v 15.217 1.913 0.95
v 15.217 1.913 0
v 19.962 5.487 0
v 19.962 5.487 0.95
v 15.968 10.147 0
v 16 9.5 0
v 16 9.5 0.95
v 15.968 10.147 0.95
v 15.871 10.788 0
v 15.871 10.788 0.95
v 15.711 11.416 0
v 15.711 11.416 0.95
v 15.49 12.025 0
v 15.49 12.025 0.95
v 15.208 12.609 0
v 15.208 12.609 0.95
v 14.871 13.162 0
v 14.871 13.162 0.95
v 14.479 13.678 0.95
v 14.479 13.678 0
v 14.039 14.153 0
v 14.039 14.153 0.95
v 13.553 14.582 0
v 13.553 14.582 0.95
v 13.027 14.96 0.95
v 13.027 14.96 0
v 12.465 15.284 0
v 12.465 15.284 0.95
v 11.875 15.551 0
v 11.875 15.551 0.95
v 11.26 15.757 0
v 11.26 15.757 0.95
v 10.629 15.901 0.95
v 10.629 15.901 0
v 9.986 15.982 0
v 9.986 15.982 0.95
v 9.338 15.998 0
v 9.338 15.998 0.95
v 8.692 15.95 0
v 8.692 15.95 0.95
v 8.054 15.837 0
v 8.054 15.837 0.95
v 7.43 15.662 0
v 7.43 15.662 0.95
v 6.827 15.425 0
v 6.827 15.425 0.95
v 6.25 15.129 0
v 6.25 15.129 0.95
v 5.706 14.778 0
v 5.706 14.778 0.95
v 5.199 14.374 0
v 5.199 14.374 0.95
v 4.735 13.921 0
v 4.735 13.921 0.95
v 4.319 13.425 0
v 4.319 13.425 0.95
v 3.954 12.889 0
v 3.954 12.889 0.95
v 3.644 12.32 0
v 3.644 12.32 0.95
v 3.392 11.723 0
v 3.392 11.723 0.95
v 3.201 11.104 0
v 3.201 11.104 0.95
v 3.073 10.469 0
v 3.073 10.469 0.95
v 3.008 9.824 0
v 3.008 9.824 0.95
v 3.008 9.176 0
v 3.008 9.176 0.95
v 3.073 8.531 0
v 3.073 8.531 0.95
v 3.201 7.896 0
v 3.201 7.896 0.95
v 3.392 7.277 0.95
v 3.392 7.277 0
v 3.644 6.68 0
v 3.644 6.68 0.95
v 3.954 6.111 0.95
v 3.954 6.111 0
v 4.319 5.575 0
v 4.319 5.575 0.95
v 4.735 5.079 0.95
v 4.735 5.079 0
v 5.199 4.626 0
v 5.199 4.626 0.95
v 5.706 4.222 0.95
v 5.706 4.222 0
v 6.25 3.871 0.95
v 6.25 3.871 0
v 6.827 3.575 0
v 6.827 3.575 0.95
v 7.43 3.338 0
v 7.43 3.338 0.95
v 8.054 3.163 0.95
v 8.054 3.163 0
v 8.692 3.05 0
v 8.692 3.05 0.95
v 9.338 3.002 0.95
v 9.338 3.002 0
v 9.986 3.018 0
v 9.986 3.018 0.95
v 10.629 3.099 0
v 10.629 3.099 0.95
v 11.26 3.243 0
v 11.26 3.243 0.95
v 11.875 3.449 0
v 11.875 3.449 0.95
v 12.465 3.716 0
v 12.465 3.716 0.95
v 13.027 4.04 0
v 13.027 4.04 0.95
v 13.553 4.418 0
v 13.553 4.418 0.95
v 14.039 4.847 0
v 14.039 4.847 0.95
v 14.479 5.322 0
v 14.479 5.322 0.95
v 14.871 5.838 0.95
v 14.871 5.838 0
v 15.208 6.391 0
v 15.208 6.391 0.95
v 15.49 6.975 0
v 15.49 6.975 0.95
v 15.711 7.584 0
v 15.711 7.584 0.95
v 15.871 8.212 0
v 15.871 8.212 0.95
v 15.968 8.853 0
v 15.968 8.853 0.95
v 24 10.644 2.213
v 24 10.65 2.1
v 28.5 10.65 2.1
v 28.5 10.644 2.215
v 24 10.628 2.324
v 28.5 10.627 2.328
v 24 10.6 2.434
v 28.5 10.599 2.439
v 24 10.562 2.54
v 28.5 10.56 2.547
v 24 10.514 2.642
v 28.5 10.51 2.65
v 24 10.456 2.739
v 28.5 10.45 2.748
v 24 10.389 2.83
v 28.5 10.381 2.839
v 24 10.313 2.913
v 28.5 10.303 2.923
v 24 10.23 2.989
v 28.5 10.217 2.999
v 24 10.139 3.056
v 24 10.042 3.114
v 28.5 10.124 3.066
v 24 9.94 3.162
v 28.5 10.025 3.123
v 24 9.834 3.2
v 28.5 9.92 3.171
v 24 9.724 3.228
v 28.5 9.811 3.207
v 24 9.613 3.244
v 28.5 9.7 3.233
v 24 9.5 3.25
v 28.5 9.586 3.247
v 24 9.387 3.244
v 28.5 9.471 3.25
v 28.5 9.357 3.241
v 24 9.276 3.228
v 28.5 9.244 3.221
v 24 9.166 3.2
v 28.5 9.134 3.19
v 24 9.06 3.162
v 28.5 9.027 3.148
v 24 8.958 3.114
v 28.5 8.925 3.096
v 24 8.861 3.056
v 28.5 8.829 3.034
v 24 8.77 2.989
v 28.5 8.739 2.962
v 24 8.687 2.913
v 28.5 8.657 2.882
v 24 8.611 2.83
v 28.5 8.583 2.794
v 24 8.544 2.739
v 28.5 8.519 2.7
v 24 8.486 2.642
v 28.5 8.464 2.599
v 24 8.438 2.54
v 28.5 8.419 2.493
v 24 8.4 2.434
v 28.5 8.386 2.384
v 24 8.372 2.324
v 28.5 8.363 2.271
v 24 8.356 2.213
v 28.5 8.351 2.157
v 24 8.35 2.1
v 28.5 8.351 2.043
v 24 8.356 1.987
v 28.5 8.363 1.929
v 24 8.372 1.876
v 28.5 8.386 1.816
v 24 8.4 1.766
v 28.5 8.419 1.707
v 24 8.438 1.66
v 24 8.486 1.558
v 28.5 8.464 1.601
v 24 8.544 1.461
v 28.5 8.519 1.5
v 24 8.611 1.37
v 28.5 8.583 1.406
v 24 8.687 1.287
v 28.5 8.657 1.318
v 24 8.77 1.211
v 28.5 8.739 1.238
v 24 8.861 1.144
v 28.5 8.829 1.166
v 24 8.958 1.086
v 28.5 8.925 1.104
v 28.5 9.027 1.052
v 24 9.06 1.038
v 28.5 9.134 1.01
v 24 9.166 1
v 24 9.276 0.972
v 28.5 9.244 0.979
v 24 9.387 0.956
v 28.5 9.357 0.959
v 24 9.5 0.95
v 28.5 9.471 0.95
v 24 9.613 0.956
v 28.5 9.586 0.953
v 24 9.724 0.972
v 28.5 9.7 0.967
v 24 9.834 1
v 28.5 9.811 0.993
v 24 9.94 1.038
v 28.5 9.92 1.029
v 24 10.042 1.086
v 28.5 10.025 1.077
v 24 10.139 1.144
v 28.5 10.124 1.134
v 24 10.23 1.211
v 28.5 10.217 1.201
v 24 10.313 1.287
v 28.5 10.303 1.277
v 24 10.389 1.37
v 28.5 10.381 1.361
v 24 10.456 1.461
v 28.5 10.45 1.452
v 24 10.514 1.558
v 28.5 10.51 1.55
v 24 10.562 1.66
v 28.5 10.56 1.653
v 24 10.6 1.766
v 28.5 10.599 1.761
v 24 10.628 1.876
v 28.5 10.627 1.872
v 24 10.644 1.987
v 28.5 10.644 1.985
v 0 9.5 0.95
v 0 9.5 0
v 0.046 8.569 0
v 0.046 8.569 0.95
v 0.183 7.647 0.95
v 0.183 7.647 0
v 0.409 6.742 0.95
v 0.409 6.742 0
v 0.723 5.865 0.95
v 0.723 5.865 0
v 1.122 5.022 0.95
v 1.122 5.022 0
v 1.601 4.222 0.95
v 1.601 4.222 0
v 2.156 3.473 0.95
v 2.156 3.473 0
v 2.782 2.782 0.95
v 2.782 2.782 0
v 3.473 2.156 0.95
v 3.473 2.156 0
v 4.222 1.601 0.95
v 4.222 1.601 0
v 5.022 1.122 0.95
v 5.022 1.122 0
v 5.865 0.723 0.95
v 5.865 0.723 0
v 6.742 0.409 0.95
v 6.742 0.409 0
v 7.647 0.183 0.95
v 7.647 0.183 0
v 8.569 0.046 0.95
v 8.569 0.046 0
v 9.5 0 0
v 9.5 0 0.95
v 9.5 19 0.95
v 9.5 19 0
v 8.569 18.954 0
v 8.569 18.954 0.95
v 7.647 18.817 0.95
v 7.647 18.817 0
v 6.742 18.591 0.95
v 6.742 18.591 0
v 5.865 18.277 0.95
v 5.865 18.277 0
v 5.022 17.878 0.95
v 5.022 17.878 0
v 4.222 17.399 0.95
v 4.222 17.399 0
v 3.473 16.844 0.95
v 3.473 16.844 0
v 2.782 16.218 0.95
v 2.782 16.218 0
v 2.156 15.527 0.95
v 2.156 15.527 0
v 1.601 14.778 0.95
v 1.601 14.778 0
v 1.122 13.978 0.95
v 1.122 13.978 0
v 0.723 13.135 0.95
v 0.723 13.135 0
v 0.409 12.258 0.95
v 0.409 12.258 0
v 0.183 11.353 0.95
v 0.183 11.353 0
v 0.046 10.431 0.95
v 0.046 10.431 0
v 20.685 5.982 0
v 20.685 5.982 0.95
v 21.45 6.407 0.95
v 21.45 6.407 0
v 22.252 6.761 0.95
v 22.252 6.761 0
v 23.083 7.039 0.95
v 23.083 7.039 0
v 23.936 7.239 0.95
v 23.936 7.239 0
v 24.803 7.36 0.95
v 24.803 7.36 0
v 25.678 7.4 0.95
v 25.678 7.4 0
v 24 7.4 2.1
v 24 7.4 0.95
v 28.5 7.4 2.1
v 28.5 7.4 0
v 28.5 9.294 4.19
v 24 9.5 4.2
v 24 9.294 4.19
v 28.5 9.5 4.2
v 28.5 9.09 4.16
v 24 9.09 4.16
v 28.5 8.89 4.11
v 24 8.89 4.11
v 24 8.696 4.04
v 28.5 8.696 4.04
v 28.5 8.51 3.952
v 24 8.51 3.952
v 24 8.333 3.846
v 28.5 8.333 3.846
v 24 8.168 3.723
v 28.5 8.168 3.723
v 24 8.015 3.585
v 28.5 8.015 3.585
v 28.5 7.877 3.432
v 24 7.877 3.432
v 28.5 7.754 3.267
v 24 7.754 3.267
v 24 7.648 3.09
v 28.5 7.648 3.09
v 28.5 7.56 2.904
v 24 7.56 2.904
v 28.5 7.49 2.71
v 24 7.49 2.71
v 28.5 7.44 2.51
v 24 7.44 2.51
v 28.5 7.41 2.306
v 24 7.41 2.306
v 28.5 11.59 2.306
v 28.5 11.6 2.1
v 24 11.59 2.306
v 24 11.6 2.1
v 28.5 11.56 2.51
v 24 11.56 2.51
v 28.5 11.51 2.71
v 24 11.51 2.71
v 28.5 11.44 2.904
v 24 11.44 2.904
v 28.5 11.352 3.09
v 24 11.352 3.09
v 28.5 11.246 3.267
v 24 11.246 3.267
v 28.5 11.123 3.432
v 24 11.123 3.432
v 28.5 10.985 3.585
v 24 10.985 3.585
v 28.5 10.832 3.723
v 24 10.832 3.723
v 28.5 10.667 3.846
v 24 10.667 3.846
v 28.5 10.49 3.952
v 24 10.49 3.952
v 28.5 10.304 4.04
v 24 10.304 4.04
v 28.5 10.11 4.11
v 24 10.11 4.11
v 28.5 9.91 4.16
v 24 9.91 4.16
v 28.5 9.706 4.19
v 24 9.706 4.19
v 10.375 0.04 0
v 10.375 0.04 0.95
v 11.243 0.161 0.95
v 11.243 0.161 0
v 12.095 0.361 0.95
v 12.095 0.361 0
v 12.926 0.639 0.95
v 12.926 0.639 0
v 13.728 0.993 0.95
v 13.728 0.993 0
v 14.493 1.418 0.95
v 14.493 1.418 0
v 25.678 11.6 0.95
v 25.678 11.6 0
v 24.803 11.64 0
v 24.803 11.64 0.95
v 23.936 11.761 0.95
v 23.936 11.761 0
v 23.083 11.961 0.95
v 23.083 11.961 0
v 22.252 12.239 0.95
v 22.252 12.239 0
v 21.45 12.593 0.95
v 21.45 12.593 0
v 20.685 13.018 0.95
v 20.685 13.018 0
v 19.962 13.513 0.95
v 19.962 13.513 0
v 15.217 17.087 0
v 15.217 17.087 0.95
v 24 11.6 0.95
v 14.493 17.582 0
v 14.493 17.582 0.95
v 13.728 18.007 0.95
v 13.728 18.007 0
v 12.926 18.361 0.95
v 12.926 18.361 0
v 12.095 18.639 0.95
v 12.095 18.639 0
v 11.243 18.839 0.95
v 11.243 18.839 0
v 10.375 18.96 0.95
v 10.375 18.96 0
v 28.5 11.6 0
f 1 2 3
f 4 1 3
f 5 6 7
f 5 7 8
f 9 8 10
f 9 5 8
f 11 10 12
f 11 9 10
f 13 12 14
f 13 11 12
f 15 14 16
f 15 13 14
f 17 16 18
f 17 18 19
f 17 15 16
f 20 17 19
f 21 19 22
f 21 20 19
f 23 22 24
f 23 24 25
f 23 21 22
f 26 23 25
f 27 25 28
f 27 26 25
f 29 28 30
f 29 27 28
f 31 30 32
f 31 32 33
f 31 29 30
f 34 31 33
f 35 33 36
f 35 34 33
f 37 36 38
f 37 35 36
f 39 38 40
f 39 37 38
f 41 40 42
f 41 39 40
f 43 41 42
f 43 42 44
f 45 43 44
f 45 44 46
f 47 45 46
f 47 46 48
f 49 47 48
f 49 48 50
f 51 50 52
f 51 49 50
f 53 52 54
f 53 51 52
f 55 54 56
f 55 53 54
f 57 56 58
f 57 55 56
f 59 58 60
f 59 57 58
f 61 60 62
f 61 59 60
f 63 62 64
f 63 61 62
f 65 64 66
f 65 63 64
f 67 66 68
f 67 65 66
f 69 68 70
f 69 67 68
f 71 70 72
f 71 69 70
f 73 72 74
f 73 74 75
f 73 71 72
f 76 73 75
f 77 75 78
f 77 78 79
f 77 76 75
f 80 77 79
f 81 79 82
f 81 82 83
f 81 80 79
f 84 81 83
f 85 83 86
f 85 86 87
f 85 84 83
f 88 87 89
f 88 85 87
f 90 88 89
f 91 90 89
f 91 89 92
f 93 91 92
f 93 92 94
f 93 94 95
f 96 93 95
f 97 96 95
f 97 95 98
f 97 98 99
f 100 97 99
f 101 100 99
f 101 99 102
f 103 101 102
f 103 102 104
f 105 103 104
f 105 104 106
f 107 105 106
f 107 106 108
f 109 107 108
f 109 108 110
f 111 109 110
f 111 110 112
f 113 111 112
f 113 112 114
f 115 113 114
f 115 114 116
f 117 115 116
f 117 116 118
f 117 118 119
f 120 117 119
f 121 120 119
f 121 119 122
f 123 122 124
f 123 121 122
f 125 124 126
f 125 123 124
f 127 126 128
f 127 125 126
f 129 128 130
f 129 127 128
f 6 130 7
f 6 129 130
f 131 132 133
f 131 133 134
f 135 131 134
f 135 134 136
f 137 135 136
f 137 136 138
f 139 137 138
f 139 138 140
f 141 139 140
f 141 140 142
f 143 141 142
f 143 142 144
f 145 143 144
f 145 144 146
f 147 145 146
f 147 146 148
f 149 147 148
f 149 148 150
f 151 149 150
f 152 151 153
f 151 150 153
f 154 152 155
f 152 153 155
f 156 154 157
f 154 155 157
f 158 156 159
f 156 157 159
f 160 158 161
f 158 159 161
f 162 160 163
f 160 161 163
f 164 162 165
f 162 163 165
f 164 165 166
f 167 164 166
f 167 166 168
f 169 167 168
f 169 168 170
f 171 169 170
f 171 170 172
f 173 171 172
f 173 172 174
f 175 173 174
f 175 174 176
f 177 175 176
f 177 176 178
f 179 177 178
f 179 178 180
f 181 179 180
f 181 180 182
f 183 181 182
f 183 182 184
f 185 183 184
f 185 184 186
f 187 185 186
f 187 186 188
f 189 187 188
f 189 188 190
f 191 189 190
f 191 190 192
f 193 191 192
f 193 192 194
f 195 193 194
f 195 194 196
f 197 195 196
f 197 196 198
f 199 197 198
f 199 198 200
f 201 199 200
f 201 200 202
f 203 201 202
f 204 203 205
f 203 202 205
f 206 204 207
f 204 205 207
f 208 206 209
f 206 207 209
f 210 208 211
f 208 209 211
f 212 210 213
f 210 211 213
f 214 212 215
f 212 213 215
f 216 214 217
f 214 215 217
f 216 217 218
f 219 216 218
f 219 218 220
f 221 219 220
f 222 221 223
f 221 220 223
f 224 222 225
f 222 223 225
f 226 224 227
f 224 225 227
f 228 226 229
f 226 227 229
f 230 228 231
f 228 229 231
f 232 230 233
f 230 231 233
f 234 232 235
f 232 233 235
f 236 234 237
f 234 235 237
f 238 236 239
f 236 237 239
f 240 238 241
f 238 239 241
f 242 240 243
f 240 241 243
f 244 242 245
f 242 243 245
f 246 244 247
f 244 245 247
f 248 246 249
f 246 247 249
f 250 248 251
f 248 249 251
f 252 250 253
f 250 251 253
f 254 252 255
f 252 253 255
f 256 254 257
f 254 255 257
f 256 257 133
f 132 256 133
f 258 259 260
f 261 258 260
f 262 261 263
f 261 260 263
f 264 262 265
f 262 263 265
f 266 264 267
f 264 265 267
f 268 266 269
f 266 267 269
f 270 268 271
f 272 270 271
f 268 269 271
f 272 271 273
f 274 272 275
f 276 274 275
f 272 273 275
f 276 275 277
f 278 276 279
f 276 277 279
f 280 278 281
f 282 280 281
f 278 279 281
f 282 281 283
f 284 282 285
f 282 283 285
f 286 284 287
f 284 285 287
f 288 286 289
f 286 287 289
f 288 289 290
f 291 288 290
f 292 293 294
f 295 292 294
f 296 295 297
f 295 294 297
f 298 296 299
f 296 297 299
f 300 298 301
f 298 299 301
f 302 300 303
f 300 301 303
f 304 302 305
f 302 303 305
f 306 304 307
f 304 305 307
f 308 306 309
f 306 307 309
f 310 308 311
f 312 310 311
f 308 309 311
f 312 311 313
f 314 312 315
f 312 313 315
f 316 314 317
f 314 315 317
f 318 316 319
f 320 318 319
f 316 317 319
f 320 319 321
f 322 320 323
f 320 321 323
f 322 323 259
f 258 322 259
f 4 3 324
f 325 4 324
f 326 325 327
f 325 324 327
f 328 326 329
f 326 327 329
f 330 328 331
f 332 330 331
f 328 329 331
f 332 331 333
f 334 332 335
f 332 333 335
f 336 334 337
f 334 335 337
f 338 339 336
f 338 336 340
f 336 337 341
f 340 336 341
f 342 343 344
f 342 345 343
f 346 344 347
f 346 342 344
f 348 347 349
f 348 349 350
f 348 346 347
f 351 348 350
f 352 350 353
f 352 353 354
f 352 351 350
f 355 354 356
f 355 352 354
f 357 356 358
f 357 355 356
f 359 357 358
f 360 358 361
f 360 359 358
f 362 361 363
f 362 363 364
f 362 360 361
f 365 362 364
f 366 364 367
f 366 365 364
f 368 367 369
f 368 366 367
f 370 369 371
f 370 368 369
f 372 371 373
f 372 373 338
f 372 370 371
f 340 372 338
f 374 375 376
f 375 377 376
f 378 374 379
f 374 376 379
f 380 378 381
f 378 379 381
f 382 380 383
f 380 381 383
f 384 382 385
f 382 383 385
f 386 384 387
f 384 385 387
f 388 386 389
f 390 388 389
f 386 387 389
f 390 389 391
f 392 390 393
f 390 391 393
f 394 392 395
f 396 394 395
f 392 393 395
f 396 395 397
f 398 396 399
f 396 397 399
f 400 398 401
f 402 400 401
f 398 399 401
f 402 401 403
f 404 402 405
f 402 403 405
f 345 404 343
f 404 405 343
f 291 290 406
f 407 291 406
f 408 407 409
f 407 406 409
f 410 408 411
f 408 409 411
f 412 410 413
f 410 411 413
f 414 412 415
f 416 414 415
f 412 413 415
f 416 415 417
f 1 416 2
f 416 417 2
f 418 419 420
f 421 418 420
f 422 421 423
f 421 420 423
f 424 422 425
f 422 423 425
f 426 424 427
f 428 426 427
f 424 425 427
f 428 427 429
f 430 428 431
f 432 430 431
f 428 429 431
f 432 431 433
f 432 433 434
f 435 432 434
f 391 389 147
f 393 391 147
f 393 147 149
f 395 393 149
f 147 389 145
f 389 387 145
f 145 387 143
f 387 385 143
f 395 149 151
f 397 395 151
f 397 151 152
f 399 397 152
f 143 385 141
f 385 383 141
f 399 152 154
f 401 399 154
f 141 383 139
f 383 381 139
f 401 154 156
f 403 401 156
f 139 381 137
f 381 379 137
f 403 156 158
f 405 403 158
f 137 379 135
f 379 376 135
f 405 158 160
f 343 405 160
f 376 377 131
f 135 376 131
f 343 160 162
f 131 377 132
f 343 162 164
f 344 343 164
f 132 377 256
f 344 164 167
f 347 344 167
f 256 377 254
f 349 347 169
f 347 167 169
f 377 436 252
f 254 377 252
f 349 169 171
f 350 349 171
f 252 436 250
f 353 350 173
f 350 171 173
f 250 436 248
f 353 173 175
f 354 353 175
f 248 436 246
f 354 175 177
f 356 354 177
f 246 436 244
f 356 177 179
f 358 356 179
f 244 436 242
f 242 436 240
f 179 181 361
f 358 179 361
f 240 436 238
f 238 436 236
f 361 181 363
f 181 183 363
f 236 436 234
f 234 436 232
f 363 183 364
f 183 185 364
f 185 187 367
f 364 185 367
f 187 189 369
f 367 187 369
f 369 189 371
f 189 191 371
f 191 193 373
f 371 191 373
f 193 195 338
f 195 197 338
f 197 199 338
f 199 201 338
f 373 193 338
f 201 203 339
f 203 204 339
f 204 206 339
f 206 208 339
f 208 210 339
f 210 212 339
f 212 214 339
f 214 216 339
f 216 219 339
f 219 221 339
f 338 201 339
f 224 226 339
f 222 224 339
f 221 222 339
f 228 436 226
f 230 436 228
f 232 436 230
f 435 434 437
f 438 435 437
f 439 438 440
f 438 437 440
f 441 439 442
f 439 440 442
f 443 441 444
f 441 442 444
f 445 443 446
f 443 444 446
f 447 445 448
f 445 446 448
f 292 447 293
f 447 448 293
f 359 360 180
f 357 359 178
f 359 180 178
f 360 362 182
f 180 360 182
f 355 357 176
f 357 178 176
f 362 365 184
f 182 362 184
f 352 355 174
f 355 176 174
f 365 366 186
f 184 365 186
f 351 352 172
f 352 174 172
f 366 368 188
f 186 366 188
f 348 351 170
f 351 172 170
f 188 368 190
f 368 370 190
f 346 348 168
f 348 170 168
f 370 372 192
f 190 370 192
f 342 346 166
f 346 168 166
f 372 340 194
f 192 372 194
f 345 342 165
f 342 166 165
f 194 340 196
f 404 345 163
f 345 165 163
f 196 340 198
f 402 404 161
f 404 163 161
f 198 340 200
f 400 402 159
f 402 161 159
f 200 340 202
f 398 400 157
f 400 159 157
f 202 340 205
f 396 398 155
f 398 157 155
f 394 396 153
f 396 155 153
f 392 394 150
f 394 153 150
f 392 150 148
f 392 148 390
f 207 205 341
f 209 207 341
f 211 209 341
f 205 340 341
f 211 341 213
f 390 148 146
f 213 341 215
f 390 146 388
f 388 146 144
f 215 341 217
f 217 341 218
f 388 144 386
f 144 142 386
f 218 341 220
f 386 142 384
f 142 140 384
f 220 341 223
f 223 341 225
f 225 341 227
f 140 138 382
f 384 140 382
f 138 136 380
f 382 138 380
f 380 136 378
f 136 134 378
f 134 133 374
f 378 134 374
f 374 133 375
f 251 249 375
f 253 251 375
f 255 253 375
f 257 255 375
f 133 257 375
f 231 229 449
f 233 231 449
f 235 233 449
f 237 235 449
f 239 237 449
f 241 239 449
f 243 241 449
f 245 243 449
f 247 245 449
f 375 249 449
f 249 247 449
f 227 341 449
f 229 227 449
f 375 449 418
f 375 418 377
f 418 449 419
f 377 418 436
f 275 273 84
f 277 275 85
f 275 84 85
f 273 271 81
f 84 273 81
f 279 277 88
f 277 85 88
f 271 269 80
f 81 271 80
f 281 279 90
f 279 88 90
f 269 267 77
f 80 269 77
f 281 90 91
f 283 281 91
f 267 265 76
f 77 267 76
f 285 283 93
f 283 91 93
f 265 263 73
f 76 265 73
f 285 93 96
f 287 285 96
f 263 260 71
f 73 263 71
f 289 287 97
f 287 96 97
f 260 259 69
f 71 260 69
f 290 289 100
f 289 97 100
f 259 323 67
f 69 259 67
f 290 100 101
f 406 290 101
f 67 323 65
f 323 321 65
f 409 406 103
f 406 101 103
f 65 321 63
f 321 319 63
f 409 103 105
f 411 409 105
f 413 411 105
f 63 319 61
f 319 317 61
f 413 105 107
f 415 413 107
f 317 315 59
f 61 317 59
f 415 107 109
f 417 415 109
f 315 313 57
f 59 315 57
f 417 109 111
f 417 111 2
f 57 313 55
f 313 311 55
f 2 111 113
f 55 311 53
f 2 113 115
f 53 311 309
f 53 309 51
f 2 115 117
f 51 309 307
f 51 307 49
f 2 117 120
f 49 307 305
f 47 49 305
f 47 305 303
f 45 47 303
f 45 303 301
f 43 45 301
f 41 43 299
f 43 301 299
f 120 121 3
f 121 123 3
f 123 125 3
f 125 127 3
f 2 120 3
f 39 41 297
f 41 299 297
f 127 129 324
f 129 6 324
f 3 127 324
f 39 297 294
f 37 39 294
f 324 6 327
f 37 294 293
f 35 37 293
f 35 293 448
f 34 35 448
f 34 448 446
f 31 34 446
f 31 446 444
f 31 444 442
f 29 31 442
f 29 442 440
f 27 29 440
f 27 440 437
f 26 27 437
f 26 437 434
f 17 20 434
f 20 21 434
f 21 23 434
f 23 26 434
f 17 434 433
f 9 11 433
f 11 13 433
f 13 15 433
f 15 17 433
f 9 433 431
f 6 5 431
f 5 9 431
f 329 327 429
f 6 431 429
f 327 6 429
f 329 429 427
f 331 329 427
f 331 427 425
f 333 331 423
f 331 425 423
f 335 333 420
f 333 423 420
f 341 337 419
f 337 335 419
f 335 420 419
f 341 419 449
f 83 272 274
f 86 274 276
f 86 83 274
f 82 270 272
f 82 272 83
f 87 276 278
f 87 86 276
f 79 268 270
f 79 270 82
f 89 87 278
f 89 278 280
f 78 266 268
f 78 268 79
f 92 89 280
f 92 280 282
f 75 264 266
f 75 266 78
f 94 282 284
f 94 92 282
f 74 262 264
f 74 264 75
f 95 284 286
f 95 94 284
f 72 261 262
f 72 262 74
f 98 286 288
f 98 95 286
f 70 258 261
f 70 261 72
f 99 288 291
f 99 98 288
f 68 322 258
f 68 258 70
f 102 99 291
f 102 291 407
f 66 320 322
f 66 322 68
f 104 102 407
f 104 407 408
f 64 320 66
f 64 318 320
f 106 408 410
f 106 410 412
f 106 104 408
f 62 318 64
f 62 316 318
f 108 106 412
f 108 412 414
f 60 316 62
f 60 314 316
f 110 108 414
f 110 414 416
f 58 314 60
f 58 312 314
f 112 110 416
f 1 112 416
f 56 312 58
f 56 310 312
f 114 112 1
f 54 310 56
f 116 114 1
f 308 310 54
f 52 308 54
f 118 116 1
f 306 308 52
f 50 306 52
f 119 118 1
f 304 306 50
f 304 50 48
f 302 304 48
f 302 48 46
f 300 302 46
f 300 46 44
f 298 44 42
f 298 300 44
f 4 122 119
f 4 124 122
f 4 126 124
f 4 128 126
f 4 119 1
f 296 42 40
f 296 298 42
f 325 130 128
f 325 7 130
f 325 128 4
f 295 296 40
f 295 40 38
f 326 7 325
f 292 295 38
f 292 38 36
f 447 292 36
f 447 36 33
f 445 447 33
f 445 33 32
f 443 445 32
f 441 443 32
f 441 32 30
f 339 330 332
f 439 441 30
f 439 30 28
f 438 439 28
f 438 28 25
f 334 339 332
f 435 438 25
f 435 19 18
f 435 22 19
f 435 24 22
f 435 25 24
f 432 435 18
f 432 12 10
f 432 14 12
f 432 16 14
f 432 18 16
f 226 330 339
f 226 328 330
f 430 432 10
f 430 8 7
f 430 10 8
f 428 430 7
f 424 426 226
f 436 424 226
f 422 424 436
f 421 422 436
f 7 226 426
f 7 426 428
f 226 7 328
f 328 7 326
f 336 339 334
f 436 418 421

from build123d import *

# Parameters (mm, degrees)
F0_R     = 6.5
F1_DEPTH = 0.95
F3_DEPTH = 3.25
F4_R     = 2.09999
F5_R     = 1.15
F6_DEPTH = 25


# Not quite as in the source:
# - a fillet or chamfer is up to 0.001 mm smaller than in the source, because OpenCascade refuses the exact size


with BuildPart() as f1:
    # F0 (on Top) → F1 (new body)
    with BuildSketch(Plane.XY):
        with BuildLine():
            Line((25.6782327866, 7.4), (28.5, 7.4))
            Line((28.5, 7.4), (28.5, 11.6))
            Line((28.5, 11.6), (25.6782327866, 11.6))
            ThreePointArc((25.6782327866, 11.6), (22.6641990968, 12.0908046465), (19.9615973522, 13.5125050702))
            Line((19.9615973522, 13.5125050702), (15.2166354344, 17.0874949298))
            ThreePointArc((15.2166354344, 17.0874949298), (12.5140336898, 18.5091953535), (9.5, 19))
            ThreePointArc((9.5, 19), (2.7824855787, 16.2175144213), (0, 9.5))
            ThreePointArc((0, 9.5), (2.7824855787, 2.7824855787), (9.5, 0))
            ThreePointArc((9.5, 0), (12.5140336898, 0.4908046465), (15.2166354344, 1.9125050702))
            Line((15.2166354344, 1.9125050702), (19.9615973522, 5.4874949298))
            ThreePointArc((19.9615973522, 5.4874949298), (22.6641990968, 6.9091953535), (25.6782327866, 7.4))
        make_face()
        with Locations((9.5, 9.5)):
            Circle(F0_R, mode=Mode.SUBTRACT)
    extrude(amount=F1_DEPTH)

    # F2 (on face) → F3 (join)
    with BuildSketch(Plane.XY.offset(0.95)):
        Polygon((28.5, 7.4), (28.5, 11.6), (25.6782327866, 11.6), (24, 11.6), (24, 7.4), (25.6782327866, 7.4), align=None)
    extrude(amount=F3_DEPTH)

    # F4 (radius 2.1 in the source; OpenCascade refuses exactly that, so slightly less here)
    f4_edges = [f1.edges().sort_by_distance(p)[0] for p in [
        (26.25, 11.6, 4.2),
        (26.25, 7.4, 4.2),
    ]]
    fillet(f4_edges, radius=F4_R)

    # F5 (on face) → F6 (cut)
    with BuildSketch(Plane.YZ.offset(28.5)):
        with Locations((9.5, 2.1)):
            Circle(F5_R)
    extrude(amount=-F6_DEPTH, mode=Mode.SUBTRACT)


solid = f1.part
